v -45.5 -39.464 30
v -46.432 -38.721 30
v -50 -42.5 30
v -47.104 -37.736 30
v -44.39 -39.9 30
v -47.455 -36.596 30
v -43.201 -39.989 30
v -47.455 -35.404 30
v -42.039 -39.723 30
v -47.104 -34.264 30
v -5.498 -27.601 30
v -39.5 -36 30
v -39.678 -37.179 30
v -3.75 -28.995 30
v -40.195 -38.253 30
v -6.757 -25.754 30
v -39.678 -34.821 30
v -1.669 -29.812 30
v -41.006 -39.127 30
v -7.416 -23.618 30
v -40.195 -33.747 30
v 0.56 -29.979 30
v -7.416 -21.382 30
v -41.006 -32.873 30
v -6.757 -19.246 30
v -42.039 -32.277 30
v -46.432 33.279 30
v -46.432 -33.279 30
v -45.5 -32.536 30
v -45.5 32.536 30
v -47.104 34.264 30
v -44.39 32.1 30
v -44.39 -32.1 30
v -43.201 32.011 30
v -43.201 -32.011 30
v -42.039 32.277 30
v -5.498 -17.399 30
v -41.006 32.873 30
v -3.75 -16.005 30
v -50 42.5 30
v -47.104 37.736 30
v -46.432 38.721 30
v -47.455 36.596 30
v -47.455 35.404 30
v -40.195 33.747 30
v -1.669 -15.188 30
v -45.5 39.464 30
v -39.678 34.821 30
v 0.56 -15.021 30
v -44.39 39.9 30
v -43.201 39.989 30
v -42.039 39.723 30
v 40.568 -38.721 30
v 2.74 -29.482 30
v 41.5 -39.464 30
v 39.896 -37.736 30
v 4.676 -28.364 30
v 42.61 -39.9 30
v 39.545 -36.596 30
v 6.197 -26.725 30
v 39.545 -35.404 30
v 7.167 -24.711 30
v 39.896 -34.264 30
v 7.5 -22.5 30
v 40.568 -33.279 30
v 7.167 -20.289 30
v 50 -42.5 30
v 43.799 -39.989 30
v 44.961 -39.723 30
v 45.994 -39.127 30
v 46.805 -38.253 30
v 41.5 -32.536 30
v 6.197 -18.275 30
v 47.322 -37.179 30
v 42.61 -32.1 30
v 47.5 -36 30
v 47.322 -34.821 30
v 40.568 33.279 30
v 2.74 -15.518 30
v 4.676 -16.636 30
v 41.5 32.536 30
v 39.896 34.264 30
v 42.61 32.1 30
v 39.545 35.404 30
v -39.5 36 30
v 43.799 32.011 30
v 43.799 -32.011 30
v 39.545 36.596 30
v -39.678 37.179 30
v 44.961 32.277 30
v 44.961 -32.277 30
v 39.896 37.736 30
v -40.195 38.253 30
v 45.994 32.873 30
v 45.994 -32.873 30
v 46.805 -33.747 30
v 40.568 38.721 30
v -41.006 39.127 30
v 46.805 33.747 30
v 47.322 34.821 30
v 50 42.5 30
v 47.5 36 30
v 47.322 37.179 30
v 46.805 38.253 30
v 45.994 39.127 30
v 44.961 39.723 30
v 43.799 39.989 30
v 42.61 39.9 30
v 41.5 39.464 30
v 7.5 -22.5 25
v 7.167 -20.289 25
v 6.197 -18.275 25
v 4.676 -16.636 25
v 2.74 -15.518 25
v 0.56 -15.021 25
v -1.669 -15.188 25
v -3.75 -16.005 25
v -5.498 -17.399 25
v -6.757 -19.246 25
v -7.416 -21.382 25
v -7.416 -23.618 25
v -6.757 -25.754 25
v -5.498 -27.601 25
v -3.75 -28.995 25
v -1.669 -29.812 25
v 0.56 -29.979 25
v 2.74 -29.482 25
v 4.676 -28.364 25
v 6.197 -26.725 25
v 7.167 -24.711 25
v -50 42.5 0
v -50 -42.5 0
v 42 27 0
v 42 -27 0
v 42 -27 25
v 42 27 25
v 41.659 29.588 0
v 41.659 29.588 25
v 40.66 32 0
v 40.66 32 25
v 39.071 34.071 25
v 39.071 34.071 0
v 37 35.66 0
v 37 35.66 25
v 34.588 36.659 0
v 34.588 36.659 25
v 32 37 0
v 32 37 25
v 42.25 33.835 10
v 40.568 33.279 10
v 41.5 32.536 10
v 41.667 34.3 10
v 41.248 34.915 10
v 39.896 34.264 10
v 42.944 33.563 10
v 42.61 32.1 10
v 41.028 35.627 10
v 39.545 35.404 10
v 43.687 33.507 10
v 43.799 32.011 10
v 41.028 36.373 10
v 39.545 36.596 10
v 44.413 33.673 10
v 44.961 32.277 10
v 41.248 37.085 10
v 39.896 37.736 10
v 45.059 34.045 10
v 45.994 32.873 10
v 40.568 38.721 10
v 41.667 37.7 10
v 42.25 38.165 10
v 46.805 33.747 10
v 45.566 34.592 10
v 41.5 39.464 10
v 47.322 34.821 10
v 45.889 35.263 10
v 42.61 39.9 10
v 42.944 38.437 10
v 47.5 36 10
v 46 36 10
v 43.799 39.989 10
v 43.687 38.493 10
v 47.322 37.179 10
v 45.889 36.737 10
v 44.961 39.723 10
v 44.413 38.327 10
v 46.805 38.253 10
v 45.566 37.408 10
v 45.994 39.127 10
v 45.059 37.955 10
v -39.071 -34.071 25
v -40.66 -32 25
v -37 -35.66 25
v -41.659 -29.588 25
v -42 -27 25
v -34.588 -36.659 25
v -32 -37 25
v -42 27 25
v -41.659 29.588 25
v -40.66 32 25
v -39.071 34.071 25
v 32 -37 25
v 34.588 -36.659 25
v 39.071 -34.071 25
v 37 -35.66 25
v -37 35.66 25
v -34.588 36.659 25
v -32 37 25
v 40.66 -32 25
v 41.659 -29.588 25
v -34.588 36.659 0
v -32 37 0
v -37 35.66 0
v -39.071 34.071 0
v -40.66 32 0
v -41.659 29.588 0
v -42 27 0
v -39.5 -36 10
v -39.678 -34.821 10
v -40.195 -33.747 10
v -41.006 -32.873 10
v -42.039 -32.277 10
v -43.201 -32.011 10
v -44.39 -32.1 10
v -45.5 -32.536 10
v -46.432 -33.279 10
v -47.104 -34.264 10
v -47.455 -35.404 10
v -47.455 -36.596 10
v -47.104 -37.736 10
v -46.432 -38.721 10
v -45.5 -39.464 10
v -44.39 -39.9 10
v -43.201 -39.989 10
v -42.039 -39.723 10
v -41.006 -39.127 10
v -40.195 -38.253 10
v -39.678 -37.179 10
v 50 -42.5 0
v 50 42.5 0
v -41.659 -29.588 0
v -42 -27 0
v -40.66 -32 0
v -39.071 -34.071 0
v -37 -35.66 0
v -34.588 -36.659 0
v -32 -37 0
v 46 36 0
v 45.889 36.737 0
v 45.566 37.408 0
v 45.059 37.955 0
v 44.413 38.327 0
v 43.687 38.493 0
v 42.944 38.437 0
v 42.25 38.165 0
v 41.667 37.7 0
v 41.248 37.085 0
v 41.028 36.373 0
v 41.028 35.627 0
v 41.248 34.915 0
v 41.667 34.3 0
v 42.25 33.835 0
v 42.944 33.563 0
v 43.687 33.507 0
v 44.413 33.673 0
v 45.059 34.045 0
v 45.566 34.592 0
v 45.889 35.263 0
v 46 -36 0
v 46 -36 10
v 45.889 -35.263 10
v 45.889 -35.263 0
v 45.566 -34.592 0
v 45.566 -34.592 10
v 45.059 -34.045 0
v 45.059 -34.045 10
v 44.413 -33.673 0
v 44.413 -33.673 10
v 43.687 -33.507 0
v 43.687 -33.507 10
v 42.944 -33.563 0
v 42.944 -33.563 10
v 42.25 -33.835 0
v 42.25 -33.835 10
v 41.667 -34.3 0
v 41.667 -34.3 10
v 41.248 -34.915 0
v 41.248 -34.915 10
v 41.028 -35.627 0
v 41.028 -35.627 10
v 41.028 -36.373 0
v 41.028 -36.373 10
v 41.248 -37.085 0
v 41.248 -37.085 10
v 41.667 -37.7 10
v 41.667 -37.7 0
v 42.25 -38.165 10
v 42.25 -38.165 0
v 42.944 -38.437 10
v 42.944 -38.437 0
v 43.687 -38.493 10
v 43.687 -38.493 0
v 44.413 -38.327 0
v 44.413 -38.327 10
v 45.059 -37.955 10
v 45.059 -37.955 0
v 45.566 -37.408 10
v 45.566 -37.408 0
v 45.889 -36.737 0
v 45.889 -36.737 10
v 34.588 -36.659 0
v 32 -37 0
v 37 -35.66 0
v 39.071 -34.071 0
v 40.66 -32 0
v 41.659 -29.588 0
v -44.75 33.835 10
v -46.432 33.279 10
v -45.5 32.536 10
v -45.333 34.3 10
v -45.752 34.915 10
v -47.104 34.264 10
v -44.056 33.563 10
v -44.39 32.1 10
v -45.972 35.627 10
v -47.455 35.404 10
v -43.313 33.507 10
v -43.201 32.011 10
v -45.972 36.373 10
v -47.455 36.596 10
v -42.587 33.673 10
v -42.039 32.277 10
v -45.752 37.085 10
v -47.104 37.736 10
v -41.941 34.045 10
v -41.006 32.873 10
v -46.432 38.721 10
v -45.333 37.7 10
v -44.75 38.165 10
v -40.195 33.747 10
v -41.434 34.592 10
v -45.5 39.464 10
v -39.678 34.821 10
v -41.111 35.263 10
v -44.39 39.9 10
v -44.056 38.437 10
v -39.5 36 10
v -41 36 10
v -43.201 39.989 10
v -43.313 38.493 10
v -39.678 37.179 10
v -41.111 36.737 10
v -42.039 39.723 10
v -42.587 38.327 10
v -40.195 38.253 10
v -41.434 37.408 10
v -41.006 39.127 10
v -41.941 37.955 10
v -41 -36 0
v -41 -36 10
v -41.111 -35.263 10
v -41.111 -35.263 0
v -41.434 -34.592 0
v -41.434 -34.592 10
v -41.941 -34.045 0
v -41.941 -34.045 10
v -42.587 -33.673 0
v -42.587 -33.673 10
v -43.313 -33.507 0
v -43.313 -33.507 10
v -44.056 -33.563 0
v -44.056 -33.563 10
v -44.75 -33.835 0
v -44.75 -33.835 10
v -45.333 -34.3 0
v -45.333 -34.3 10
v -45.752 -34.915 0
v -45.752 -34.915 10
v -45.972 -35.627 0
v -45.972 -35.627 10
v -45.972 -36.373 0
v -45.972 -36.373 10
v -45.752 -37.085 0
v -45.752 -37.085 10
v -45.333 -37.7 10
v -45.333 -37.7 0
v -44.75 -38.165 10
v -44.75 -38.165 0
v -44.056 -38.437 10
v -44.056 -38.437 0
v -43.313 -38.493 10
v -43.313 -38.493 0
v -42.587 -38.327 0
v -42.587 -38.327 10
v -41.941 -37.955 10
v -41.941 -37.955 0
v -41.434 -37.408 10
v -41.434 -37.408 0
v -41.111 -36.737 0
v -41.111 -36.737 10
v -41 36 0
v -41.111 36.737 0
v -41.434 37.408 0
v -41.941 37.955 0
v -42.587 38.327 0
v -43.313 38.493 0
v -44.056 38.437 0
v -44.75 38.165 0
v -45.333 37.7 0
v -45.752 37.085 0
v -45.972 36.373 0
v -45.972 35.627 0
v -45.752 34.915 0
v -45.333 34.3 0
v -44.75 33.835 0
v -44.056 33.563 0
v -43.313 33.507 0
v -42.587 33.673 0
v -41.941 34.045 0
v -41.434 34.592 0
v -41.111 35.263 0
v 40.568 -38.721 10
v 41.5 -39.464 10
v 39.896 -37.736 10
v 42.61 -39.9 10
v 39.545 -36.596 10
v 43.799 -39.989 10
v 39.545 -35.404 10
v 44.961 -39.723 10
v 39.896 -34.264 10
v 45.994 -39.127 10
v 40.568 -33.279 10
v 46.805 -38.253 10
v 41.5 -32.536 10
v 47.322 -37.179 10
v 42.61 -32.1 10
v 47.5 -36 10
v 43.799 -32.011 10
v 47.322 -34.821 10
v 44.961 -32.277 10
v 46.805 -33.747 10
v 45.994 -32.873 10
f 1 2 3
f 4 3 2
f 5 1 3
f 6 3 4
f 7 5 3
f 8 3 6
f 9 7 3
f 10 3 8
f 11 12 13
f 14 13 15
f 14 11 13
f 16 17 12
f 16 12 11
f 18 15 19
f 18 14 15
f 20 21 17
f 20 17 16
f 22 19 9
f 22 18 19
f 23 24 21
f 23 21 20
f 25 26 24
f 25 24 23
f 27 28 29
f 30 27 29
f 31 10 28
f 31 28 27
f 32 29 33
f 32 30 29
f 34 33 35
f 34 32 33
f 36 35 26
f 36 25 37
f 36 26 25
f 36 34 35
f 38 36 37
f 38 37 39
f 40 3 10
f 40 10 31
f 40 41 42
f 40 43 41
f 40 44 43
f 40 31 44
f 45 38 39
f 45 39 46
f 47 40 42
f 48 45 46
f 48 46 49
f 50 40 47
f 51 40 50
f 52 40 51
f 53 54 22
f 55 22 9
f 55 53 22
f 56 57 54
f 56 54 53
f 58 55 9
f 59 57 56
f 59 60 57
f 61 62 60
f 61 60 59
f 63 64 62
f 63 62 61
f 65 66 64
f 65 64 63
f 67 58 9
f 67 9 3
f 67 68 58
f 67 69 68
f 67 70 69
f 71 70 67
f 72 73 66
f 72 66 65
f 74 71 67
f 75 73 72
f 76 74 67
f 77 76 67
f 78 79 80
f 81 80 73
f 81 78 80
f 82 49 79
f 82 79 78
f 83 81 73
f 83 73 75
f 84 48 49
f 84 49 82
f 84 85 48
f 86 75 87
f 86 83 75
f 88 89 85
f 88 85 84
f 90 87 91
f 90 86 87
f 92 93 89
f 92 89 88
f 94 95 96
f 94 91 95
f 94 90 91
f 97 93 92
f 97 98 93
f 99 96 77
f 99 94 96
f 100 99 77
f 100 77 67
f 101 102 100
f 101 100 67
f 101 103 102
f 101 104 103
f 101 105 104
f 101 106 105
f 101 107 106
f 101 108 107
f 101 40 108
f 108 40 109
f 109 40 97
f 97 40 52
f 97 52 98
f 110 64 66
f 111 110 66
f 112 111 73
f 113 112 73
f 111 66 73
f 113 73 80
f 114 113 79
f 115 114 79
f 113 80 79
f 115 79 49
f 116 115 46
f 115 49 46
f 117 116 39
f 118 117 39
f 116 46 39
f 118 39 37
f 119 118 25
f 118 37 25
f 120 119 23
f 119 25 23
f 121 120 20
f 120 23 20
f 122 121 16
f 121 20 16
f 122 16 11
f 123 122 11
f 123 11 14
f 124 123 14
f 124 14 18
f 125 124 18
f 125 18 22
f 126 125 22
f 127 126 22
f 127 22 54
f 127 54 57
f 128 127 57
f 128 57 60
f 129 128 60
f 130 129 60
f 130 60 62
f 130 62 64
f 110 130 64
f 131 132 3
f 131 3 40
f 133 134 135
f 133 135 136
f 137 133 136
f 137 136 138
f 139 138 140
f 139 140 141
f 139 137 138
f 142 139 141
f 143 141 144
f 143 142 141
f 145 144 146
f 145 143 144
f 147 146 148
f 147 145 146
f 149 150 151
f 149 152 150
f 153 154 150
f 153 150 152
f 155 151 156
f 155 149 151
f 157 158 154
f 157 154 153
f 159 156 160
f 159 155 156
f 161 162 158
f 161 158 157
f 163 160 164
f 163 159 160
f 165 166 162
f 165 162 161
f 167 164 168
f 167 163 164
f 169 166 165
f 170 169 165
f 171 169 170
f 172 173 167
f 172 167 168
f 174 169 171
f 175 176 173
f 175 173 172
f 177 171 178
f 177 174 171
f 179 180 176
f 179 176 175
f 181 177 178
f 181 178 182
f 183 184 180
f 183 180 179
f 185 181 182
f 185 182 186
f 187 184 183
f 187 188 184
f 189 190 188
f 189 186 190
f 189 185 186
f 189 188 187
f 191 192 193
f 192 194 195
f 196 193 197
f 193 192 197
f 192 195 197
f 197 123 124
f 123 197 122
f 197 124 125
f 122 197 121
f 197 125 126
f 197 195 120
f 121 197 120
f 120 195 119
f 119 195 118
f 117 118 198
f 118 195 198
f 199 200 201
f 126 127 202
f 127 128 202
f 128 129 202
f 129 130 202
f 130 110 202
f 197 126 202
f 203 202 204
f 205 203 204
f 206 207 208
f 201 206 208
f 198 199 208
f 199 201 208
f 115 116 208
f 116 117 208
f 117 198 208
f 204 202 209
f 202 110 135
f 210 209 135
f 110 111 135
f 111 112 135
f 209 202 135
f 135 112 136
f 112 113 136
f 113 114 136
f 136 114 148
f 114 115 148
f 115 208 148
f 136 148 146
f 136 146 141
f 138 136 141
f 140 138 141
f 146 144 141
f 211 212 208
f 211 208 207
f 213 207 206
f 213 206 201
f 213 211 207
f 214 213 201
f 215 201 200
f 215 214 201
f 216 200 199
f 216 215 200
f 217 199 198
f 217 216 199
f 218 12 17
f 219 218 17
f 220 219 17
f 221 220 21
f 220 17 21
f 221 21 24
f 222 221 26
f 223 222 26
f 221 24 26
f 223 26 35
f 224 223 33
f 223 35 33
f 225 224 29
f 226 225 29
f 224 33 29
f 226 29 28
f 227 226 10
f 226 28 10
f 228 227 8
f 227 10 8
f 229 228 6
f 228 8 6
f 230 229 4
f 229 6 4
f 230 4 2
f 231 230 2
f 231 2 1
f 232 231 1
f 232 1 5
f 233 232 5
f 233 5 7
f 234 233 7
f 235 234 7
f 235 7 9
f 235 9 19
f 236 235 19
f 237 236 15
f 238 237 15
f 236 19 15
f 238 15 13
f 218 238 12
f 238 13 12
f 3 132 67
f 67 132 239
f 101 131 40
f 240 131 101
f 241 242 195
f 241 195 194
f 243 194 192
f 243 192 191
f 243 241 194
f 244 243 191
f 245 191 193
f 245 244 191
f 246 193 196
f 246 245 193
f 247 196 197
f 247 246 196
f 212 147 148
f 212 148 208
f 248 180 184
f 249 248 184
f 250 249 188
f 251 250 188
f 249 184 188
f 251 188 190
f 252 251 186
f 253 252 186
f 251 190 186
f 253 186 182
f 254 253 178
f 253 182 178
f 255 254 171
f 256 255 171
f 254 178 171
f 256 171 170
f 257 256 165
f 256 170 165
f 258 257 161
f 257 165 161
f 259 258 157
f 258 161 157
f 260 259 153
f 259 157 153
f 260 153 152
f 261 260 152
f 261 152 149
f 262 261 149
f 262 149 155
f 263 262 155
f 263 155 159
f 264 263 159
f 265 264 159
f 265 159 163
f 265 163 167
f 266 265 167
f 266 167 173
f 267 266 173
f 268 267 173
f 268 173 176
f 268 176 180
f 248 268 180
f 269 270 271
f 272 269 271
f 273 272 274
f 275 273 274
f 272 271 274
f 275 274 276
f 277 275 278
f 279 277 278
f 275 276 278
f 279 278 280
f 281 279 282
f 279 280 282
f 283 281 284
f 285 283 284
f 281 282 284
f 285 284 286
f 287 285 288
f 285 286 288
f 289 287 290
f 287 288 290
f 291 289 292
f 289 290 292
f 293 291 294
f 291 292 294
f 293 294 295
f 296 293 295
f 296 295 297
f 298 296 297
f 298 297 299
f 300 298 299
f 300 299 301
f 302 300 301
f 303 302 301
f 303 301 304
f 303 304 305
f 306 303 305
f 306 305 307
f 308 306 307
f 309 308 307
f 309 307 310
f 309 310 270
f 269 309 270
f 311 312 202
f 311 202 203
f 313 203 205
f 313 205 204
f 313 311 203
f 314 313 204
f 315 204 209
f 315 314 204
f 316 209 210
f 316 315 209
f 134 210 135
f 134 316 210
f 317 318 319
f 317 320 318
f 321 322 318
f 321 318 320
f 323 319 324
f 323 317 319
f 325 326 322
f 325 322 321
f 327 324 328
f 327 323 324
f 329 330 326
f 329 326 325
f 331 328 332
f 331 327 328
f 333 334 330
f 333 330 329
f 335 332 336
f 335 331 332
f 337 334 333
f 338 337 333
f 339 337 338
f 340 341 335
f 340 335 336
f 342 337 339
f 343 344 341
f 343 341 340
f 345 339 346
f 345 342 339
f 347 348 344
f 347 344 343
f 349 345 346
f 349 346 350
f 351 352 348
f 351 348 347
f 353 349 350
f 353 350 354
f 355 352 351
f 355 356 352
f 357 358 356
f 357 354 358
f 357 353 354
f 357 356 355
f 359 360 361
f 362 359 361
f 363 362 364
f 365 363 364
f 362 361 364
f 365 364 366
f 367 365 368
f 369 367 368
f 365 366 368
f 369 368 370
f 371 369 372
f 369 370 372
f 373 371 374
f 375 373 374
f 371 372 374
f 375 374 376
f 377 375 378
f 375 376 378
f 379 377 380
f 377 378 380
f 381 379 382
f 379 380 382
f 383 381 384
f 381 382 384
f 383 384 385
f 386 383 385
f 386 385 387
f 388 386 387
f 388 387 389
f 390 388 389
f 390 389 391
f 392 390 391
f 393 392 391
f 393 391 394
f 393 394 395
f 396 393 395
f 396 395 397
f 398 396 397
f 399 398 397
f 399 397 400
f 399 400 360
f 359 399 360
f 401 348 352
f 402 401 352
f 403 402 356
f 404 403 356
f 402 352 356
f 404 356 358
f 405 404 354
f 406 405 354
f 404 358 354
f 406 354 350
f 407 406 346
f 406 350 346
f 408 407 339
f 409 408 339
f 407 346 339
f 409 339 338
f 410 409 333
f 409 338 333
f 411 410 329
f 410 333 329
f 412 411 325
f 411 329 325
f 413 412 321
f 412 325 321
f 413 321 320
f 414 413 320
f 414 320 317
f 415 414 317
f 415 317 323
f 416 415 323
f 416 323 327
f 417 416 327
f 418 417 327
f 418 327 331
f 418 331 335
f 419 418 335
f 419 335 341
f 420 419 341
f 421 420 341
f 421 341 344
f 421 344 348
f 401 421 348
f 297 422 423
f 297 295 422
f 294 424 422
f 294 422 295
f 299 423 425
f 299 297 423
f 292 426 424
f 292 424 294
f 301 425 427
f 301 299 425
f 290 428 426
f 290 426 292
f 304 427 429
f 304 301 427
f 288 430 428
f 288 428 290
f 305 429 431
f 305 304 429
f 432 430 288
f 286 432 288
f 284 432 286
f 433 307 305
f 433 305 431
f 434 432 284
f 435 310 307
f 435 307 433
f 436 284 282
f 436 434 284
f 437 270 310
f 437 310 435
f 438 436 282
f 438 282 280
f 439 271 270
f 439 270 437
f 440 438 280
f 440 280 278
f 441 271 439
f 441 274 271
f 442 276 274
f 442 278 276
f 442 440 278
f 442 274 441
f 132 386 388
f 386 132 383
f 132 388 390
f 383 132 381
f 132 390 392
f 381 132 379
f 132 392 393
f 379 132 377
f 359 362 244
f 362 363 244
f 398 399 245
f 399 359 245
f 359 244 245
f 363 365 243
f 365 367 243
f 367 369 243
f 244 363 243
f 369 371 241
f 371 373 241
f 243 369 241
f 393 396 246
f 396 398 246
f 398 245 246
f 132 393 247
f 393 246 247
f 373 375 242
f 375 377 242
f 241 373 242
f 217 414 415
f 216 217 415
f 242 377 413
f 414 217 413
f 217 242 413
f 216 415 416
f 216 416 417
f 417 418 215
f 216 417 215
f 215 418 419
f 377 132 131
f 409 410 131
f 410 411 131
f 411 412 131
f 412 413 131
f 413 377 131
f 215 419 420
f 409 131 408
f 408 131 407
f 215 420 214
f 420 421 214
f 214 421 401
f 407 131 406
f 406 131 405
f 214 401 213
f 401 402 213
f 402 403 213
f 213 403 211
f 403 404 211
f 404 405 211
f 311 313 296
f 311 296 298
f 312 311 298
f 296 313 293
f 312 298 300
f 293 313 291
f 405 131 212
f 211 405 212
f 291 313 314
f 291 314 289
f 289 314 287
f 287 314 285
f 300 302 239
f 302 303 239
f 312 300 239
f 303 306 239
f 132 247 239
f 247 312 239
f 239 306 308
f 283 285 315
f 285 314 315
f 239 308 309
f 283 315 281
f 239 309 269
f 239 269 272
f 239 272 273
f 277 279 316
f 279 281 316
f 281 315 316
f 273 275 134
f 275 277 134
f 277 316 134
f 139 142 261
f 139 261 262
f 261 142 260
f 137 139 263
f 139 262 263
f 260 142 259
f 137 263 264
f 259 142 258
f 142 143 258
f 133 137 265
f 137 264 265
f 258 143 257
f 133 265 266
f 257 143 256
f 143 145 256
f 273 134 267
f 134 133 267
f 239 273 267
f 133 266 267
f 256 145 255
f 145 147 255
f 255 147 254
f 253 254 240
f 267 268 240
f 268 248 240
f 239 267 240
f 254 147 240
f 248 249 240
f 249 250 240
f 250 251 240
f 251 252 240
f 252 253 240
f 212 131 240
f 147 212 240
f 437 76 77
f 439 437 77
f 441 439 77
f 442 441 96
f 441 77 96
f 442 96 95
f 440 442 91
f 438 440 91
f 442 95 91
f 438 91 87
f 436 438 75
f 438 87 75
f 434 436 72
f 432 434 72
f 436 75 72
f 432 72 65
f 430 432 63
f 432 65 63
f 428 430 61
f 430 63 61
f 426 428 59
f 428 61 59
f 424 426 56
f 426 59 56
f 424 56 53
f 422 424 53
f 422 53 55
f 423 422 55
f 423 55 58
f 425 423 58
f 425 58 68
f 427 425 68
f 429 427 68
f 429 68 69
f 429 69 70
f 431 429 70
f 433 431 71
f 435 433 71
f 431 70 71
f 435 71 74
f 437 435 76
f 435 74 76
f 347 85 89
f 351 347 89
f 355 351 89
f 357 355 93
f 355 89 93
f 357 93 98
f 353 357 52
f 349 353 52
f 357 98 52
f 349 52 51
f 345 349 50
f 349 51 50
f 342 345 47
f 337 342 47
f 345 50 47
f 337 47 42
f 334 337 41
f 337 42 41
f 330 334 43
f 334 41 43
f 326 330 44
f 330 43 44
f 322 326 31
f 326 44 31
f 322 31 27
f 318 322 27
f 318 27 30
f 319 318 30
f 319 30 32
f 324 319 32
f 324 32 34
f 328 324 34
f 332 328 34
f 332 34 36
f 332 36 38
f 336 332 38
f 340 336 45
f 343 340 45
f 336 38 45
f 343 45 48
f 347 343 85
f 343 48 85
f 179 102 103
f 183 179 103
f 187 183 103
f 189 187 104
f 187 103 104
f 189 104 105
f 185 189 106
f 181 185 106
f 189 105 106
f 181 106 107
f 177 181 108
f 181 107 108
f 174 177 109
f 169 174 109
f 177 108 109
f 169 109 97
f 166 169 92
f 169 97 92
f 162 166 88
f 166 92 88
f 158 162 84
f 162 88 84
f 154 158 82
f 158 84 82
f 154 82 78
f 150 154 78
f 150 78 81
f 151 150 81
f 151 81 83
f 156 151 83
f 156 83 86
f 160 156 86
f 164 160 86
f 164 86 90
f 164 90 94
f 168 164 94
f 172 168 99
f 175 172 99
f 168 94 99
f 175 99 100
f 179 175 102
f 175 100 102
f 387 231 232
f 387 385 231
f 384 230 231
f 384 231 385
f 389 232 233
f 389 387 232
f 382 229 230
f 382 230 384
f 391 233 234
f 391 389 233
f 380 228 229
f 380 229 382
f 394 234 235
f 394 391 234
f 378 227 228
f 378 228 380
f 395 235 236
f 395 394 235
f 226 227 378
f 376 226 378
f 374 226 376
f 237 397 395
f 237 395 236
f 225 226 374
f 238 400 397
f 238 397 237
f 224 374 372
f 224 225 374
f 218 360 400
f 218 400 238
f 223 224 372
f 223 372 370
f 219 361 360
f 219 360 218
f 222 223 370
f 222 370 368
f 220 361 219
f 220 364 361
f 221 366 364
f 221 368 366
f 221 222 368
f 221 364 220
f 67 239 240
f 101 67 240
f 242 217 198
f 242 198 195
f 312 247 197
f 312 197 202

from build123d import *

# Parameters (mm, degrees)
SKETCH1_W           = 100
SKETCH1_H           = 85
BOSS_EXTRUDE1_DEPTH = 30
SKETCH3_R           = 2.5
CUT_EXTRUDE1_DEPTH  = 50
SKETCH4_R           = 4
CUT_EXTRUDE2_DEPTH  = 20
CUT_EXTRUDE5_DEPTH  = 25
SKETCH8_R           = 7.5
CUT_EXTRUDE6_DEPTH  = 31


with BuildPart() as part:
    # Sketch1 → Boss-Extrude1 (new body)
    with BuildSketch(Plane.XY):
        Rectangle(SKETCH1_W, SKETCH1_H)
    extrude(amount=BOSS_EXTRUDE1_DEPTH)

    # Sketch3 → Cut-Extrude1 (cut)
    with BuildSketch(Plane.XY.offset(30)):
        with Locations((-43.5, 36)):
            Circle(SKETCH3_R)
        with Locations((43.5, 36)):
            Circle(SKETCH3_R)
        with Locations((43.5, -36)):
            Circle(SKETCH3_R)
        with Locations((-43.5, -36)):
            Circle(SKETCH3_R)
    extrude(amount=-CUT_EXTRUDE1_DEPTH, mode=Mode.SUBTRACT)

    # Sketch4 → Cut-Extrude2 (cut)
    with BuildSketch(Plane.XY.offset(30)):
        with Locations((-43.5, 36)):
            Circle(SKETCH4_R)
        with Locations((43.5, 36)):
            Circle(SKETCH4_R)
        with Locations((-43.5, -36)):
            Circle(SKETCH4_R)
        with Locations((43.5, -36)):
            Circle(SKETCH4_R)
    extrude(amount=-CUT_EXTRUDE2_DEPTH, mode=Mode.SUBTRACT)

    # Sketch7 → Cut-Extrude5 (cut)
    with BuildSketch(Plane(origin=(0, 0, 0), x_dir=(-1, 0, 0), z_dir=(0, 0, -1))):
        with BuildLine():
            Line((-32, 37), (32, 37))
            ThreePointArc((32, 37), (39.071067812, 34.071067812), (42, 27))
            Line((42, 27), (42, -27))
            ThreePointArc((42, -27), (39.071067812, -34.071067812), (32, -37))
            Line((32, -37), (-32, -37))
            ThreePointArc((-32, -37), (-39.071067812, -34.071067812), (-42, -27))
            Line((-42, -27), (-42, 27))
            ThreePointArc((-42, 27), (-39.071067812, 34.071067812), (-32, 37))
        make_face()
    extrude(amount=-CUT_EXTRUDE5_DEPTH, mode=Mode.SUBTRACT)

    # Sketch8 → Cut-Extrude6 (cut, through all)
    with BuildSketch(Plane.XY.offset(30)):
        with Locations((0, -22.5)):
            Circle(SKETCH8_R)
    extrude(amount=-CUT_EXTRUDE6_DEPTH, mode=Mode.SUBTRACT)


solid = part.part
